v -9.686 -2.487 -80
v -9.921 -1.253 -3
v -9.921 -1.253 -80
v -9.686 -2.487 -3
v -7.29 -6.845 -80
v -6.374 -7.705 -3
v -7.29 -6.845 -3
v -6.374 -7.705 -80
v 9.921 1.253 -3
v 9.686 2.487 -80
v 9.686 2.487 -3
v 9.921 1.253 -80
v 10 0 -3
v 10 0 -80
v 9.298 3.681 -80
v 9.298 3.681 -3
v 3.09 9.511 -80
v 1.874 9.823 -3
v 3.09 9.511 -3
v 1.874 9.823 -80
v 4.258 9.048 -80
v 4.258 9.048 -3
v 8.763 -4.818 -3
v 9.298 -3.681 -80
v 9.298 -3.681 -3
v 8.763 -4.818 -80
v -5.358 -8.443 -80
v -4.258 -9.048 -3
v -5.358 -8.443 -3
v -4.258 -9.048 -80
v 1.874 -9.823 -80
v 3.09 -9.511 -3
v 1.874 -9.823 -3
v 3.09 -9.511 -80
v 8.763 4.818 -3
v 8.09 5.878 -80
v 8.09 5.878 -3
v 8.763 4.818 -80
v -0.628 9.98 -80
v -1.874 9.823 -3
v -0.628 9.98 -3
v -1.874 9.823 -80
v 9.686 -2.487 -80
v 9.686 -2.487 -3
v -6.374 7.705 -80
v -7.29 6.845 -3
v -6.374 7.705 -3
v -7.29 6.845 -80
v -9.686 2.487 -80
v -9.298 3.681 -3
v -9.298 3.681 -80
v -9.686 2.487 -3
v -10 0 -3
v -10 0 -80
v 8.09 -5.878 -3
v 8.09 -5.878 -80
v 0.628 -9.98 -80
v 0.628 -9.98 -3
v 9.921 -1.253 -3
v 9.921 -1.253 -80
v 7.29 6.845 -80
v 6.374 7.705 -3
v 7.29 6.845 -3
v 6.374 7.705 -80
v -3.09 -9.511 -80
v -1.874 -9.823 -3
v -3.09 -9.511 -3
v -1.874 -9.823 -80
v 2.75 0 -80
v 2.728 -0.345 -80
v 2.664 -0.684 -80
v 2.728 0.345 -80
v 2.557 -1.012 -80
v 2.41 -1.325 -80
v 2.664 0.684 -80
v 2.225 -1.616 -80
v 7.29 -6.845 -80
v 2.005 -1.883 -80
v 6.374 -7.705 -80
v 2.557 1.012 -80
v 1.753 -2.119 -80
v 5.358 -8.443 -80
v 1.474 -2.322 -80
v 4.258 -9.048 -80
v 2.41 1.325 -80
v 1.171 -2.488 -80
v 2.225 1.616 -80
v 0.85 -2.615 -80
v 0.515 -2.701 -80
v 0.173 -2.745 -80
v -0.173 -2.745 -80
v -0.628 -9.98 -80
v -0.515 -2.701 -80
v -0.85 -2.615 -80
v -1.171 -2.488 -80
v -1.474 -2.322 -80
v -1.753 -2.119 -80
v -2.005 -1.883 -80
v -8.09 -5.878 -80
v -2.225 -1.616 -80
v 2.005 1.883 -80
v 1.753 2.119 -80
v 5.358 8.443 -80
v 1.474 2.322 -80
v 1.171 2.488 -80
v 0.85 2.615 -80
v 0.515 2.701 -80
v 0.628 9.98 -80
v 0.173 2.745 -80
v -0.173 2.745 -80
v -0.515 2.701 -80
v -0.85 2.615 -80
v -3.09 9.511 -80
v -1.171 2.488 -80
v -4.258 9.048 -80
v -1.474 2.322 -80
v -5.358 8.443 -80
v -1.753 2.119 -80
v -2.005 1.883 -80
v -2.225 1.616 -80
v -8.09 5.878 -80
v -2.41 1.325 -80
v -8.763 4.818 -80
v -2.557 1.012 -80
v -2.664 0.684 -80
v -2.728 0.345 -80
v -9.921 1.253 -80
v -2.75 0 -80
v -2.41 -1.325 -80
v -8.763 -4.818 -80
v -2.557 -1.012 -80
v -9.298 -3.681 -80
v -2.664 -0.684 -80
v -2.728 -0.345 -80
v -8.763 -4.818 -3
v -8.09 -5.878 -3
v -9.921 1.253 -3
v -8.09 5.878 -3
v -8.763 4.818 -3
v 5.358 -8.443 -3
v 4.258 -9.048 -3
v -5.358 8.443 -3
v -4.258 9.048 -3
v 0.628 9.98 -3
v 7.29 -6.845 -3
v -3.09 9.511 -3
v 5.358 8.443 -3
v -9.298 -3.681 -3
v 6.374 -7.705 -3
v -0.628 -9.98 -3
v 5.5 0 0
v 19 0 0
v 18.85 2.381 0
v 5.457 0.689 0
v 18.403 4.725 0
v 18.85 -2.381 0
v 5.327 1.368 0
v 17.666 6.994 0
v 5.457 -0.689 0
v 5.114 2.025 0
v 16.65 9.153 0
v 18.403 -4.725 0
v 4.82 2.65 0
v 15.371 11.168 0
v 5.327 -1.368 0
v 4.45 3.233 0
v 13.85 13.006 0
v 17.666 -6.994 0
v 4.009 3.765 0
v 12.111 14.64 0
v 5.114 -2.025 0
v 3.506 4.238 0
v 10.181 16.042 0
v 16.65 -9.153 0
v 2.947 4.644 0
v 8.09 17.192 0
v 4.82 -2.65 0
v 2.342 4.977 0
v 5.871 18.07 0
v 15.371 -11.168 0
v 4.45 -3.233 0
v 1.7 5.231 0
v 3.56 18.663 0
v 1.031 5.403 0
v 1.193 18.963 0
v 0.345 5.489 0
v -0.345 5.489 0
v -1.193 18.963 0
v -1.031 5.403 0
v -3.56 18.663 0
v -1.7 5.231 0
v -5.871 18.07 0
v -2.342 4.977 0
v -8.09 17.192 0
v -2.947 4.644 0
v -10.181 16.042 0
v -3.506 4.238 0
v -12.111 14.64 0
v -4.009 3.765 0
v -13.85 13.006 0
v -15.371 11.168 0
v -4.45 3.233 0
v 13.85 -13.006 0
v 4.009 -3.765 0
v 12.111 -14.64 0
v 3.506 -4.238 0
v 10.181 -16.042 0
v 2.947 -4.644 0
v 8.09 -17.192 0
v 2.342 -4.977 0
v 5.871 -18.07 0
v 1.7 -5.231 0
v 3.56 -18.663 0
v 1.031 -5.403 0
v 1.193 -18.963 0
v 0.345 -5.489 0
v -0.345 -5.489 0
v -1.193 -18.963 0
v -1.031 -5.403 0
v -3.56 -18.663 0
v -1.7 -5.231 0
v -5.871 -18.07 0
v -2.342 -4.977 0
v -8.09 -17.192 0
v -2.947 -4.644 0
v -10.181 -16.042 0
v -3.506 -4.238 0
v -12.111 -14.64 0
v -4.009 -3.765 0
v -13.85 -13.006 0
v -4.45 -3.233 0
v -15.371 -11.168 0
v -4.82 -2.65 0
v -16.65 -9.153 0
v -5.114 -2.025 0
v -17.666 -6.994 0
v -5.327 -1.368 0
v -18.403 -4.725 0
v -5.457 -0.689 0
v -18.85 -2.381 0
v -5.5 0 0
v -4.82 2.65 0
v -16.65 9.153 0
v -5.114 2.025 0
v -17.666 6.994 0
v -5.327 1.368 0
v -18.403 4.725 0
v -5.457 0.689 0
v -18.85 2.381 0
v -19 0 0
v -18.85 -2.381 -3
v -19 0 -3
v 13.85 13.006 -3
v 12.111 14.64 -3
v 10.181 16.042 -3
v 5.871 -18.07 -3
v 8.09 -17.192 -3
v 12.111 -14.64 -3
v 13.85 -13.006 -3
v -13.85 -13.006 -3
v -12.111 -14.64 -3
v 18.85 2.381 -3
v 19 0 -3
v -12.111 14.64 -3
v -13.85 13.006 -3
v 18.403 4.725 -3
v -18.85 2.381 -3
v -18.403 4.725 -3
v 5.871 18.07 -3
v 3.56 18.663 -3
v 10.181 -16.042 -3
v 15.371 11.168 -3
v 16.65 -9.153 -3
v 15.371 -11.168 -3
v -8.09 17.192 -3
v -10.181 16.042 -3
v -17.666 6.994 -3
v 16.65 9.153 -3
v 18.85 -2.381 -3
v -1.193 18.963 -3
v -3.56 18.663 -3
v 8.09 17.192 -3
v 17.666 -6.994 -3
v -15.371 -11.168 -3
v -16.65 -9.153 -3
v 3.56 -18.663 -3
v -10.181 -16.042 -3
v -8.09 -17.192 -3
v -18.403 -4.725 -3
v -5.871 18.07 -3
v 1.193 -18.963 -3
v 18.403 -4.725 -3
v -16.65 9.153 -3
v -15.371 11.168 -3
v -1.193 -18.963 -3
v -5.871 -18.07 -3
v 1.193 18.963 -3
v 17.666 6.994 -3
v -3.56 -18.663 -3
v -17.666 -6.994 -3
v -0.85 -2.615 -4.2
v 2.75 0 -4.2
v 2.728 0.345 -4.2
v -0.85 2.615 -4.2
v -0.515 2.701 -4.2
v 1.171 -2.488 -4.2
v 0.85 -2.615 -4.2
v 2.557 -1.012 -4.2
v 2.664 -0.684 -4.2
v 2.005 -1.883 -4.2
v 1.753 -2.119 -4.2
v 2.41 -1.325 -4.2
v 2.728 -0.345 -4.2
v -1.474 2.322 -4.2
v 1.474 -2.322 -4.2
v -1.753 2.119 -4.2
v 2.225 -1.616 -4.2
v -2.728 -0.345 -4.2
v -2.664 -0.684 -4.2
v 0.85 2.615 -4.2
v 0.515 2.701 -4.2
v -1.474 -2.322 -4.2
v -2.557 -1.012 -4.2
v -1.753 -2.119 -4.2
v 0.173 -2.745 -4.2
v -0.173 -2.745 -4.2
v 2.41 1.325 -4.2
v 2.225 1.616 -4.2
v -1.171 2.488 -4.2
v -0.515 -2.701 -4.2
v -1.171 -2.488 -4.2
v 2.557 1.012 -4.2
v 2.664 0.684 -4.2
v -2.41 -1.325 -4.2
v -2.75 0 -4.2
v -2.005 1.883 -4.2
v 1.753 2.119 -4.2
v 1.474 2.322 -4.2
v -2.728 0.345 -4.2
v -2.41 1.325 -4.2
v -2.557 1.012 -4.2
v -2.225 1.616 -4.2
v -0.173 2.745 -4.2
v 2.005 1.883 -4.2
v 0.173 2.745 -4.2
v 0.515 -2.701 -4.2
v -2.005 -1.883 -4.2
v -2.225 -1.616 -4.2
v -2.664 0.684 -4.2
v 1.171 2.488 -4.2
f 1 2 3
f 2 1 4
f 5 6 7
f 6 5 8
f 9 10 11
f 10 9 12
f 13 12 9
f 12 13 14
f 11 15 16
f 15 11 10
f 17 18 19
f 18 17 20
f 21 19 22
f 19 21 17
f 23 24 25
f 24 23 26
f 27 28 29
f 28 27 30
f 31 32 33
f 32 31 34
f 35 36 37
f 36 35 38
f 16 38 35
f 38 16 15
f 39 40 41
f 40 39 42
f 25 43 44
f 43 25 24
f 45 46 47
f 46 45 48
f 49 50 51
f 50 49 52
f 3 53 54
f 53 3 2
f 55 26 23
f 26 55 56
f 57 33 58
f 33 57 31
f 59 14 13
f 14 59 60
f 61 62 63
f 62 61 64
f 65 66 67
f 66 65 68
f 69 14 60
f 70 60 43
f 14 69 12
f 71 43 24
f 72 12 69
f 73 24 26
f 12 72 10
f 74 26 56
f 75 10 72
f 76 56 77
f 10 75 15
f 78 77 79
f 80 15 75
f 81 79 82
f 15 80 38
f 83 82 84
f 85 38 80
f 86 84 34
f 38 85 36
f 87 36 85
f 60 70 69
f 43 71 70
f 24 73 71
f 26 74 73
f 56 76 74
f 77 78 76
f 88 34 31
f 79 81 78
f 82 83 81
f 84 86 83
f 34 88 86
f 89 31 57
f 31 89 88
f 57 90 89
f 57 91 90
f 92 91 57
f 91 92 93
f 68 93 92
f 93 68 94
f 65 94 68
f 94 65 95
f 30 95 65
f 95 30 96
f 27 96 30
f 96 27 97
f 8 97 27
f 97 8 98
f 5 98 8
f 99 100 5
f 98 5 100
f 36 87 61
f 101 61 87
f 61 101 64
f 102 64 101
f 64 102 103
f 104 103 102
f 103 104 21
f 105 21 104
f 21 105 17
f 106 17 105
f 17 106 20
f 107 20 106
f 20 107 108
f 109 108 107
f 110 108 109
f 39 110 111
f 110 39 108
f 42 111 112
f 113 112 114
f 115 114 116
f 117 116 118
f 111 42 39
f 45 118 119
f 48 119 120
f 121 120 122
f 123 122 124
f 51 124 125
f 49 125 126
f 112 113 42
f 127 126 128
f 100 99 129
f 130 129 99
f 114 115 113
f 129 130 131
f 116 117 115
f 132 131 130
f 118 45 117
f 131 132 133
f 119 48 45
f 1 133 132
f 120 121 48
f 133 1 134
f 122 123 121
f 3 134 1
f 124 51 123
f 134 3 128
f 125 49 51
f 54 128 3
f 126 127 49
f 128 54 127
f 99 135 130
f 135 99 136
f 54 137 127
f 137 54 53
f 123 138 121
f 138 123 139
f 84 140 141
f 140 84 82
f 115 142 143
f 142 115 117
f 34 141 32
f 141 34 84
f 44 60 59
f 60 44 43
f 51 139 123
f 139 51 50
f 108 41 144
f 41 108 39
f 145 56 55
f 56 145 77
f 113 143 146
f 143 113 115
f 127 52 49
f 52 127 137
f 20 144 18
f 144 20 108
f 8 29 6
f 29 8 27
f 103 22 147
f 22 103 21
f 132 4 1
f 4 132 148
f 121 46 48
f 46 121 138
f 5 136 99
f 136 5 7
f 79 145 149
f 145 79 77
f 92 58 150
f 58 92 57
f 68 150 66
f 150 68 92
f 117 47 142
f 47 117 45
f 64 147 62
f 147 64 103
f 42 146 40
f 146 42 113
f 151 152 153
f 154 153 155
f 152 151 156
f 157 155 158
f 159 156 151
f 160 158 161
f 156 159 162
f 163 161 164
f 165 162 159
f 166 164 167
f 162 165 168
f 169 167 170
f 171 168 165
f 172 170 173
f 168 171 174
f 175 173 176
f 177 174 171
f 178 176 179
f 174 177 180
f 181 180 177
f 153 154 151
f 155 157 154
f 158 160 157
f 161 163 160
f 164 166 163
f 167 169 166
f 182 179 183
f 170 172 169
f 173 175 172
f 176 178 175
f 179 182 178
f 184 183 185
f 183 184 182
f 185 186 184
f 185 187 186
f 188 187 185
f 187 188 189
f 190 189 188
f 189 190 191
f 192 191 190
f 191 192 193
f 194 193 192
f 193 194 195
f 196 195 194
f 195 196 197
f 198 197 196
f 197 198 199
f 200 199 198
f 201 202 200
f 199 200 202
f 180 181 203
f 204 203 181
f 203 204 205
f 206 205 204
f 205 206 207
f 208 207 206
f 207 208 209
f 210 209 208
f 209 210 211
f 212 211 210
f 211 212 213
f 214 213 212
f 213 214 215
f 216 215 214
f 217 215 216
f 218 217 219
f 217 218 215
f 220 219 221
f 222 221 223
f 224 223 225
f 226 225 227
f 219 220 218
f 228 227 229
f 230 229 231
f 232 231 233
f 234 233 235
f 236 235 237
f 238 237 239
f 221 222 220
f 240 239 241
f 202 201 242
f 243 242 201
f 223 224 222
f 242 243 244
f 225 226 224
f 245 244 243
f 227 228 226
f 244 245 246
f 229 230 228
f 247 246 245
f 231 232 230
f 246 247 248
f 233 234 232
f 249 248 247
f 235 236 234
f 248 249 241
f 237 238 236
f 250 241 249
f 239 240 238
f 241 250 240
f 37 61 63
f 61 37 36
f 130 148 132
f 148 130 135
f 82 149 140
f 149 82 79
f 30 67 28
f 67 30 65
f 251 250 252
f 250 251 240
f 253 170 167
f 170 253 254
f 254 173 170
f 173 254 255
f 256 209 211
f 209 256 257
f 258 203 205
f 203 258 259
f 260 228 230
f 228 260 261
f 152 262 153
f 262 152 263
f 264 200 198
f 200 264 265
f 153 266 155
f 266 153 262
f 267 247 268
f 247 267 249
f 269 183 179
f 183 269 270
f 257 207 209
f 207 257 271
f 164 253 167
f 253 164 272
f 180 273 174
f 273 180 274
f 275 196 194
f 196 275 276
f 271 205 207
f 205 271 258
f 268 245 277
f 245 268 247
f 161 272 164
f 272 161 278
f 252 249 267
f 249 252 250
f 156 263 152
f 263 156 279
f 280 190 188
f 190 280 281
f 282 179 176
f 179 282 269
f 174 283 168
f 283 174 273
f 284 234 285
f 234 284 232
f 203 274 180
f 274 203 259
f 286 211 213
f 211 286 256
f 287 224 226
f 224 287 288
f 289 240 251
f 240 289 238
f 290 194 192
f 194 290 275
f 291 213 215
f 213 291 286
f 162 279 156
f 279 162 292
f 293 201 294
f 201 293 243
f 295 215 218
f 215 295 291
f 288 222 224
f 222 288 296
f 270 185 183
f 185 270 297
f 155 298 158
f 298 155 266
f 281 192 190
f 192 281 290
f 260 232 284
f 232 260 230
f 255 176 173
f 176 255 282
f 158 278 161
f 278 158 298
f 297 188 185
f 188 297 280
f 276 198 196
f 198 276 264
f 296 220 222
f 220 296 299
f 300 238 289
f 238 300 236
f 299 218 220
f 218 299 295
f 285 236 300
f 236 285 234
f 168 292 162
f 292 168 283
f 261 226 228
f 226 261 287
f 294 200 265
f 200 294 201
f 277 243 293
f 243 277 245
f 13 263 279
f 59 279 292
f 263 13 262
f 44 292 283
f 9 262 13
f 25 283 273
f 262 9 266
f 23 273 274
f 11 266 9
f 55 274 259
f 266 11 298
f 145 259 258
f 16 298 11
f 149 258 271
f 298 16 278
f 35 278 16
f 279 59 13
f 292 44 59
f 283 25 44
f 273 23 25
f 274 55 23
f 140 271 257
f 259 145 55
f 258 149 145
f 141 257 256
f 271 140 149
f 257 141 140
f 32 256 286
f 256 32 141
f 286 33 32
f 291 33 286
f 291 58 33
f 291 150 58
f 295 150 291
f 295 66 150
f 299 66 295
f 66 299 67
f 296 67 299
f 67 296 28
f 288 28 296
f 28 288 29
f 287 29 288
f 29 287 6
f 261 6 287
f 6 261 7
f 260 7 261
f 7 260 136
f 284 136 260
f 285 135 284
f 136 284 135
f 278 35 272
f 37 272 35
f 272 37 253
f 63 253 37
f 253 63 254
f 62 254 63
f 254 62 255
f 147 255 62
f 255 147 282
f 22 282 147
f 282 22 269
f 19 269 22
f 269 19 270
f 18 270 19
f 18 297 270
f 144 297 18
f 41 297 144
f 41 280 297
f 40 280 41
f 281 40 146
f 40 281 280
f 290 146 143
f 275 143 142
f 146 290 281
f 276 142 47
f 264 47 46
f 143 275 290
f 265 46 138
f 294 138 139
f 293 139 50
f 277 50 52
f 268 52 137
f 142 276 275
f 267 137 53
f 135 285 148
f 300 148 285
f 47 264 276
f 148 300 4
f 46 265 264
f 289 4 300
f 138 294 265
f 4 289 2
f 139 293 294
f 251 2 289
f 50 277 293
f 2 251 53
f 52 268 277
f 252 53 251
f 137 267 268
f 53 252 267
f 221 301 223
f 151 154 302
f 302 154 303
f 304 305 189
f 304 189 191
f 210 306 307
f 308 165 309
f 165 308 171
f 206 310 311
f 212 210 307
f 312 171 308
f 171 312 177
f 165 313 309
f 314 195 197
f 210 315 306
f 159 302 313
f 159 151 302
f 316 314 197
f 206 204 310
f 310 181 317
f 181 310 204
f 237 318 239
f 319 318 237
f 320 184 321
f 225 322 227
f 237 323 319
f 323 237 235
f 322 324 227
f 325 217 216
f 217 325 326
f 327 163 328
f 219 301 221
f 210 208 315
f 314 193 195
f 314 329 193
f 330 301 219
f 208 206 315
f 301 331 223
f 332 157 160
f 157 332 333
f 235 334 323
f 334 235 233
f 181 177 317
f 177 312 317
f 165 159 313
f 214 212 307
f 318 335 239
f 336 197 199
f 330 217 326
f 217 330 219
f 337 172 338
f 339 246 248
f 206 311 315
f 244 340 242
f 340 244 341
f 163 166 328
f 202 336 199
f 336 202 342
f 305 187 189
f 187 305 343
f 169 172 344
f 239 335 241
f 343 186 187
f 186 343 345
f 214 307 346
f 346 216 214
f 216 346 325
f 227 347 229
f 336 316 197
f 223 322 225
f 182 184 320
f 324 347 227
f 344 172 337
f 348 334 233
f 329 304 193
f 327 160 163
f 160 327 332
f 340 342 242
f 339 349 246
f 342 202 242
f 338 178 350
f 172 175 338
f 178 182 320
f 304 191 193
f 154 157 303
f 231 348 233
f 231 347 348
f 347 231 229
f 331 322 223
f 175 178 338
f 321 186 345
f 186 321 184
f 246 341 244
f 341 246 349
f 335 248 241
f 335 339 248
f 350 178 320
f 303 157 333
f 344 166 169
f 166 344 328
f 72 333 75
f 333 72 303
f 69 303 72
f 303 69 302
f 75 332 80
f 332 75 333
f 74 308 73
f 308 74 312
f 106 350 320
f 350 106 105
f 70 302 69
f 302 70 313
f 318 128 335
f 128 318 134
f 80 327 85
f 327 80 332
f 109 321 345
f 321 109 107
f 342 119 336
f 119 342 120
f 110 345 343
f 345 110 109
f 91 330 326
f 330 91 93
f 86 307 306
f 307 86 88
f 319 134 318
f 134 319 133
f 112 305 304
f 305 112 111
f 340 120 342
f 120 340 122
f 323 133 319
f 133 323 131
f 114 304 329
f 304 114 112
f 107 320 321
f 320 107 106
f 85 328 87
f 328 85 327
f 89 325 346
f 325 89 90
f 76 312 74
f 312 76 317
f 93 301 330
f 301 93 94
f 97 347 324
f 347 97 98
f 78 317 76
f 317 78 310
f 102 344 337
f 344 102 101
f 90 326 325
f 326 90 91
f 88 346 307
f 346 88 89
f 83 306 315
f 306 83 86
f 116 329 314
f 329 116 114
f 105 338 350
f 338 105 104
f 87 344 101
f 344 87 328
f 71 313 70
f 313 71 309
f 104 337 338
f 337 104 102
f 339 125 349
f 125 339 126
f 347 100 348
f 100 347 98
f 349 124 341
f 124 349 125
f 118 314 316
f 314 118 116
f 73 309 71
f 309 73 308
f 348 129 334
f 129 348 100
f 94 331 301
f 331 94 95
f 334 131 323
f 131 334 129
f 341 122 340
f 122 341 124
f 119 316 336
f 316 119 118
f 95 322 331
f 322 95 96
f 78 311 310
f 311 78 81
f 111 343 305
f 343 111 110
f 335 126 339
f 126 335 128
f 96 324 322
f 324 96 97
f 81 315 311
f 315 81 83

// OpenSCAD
$fn = 50;


difference() {
	union() {
		translate(v = [0, 0, -80.0000000000]) {
			cylinder(h = 80, r = 10.0000000000);
		}
		translate(v = [0, 0, -3.0000000000]) {
			cylinder(h = 3, r = 19.0000000000);
		}
	}
	union() {
		translate(v = [0, 0, 0]) {
			rotate(a = [0, 0, 0]) {
				difference() {
					union() {
						#translate(v = [0, 0, -80.0000000000]) {
							cylinder(h = 80, r = 2.2500000000);
						}
						#translate(v = [0, 0, -4.2000000000]) {
							cylinder(h = 4.2000000000, r1 = 2.7500000000, r2 = 5.5000000000);
						}
						#translate(v = [0, 0, -80.0000000000]) {
							cylinder(h = 80, r = 2.7500000000);
						}
						#translate(v = [0, 0, -80.0000000000]) {
							cylinder(h = 80, r = 2.2500000000);
						}
					}
					union();
				}
			}
		}
	}
}
